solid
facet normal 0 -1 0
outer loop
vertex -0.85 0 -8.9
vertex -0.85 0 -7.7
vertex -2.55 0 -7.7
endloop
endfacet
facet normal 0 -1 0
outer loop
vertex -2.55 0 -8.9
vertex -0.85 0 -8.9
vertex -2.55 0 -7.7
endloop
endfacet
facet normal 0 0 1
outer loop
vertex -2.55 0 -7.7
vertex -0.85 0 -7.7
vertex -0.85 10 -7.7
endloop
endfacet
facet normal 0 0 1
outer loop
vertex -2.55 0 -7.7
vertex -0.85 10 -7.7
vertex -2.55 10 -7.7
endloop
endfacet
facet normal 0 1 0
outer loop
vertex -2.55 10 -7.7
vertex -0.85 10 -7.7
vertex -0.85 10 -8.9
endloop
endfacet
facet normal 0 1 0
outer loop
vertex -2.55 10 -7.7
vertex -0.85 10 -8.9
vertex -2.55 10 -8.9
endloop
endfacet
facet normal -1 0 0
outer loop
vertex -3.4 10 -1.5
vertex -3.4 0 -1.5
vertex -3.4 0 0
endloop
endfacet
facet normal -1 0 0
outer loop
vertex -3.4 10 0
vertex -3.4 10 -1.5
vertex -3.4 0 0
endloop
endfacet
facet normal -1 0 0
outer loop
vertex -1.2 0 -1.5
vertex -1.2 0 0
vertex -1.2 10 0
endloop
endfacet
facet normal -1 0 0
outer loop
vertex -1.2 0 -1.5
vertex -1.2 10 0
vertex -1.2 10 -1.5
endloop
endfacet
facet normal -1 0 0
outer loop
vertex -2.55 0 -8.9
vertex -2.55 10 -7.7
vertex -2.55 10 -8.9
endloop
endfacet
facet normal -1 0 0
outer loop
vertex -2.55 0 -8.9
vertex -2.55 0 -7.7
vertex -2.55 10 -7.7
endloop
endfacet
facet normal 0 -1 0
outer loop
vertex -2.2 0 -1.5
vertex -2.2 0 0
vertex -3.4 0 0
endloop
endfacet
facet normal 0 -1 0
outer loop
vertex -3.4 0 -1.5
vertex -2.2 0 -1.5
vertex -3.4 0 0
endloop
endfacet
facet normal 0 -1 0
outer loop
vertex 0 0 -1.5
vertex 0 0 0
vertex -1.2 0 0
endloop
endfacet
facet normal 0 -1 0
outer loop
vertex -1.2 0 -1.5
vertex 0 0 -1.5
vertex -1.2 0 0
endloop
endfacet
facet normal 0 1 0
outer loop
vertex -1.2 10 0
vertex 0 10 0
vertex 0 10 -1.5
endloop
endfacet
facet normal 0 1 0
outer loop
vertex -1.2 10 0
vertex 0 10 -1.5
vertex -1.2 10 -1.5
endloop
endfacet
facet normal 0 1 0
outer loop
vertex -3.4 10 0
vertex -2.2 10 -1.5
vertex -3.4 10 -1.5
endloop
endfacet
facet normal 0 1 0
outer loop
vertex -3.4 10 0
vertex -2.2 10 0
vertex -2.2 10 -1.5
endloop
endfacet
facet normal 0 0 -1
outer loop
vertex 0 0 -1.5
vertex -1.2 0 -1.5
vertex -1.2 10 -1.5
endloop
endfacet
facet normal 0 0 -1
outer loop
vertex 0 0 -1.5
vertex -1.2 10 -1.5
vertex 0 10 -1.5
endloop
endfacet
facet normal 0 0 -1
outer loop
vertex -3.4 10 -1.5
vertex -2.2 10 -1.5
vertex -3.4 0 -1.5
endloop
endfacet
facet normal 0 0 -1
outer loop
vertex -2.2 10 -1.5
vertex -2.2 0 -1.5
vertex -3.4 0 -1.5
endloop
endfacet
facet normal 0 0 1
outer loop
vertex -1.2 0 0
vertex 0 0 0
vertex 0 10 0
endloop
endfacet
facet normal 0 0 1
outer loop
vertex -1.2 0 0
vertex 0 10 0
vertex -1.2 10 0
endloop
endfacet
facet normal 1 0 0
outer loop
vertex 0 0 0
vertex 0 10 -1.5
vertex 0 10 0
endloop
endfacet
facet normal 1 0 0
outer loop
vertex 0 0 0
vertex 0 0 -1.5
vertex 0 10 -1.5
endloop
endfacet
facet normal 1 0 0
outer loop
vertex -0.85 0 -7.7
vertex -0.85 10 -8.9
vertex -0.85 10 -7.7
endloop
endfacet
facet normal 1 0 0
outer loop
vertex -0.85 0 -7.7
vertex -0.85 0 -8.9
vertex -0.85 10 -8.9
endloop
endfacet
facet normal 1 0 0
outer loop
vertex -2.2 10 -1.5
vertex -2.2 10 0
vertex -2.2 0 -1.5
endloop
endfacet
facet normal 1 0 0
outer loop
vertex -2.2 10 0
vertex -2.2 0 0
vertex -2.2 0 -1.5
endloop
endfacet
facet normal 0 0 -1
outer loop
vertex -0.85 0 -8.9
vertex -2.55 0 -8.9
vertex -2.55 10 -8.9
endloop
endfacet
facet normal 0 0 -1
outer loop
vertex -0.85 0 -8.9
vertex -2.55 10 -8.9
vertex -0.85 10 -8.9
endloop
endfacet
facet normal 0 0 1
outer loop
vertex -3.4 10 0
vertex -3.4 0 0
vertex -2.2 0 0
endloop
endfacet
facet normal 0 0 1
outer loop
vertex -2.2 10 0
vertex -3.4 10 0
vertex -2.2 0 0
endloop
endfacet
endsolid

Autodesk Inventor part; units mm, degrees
ref_plane "YZ Plane" through (0, 0, 0) normal (1, 0, 0) x (0, 1, 0)
ref_plane "XZ Plane" through (0, 0, 0) normal (0, 1, 0) x (-1, 0, 0)
ref_plane "XY Plane" through (0, 0, 0) normal (0, 0, 1) x (1, 0, 0)
sketch "Sketch1" plane through (0, 0, 0) normal (0, 1, 0) x (-1, 0, 0)
  line L0 (0, 0) -> (1.2, 0)
  line L1 (1.2, 0) -> (1.2, -1.5)
  line L2 (1.2, -1.5) -> (0, -1.5)
  line L3 (0, -1.5) -> (0, 0)
  line L4 (3.4, 0) -> (2.2, 0)
  line L5 (2.2, 0) -> (2.2, -1.5)
  line L6 (2.2, -1.5) -> (3.4, -1.5)
  line L7 (3.4, -1.5) -> (3.4, 0)
  line L8 (0.85, -7.7) -> (2.55, -7.7)
  line L9 (2.55, -7.7) -> (2.55, -8.9)
  line L10 (2.55, -8.9) -> (0.85, -8.9)
  line L11 (0.85, -8.9) -> (0.85, -7.7)
  point P0 (1.2, -0.75)
  dimension "d0" = 1.2
  dimension "d1" = 1.5
  dimension "d5" = 1.2
  dimension "d6" = 1.5
  dimension "d7" = 1
  dimension "d8" = 1.7
  dimension "d9" = 1.2
  dimension "d10" = 6.2
  dimension "d11" = 0.85
extrude "Extrusion1" add sketch "Sketch1" along normal blind 10
properties part number "hv_trans_footprint"
